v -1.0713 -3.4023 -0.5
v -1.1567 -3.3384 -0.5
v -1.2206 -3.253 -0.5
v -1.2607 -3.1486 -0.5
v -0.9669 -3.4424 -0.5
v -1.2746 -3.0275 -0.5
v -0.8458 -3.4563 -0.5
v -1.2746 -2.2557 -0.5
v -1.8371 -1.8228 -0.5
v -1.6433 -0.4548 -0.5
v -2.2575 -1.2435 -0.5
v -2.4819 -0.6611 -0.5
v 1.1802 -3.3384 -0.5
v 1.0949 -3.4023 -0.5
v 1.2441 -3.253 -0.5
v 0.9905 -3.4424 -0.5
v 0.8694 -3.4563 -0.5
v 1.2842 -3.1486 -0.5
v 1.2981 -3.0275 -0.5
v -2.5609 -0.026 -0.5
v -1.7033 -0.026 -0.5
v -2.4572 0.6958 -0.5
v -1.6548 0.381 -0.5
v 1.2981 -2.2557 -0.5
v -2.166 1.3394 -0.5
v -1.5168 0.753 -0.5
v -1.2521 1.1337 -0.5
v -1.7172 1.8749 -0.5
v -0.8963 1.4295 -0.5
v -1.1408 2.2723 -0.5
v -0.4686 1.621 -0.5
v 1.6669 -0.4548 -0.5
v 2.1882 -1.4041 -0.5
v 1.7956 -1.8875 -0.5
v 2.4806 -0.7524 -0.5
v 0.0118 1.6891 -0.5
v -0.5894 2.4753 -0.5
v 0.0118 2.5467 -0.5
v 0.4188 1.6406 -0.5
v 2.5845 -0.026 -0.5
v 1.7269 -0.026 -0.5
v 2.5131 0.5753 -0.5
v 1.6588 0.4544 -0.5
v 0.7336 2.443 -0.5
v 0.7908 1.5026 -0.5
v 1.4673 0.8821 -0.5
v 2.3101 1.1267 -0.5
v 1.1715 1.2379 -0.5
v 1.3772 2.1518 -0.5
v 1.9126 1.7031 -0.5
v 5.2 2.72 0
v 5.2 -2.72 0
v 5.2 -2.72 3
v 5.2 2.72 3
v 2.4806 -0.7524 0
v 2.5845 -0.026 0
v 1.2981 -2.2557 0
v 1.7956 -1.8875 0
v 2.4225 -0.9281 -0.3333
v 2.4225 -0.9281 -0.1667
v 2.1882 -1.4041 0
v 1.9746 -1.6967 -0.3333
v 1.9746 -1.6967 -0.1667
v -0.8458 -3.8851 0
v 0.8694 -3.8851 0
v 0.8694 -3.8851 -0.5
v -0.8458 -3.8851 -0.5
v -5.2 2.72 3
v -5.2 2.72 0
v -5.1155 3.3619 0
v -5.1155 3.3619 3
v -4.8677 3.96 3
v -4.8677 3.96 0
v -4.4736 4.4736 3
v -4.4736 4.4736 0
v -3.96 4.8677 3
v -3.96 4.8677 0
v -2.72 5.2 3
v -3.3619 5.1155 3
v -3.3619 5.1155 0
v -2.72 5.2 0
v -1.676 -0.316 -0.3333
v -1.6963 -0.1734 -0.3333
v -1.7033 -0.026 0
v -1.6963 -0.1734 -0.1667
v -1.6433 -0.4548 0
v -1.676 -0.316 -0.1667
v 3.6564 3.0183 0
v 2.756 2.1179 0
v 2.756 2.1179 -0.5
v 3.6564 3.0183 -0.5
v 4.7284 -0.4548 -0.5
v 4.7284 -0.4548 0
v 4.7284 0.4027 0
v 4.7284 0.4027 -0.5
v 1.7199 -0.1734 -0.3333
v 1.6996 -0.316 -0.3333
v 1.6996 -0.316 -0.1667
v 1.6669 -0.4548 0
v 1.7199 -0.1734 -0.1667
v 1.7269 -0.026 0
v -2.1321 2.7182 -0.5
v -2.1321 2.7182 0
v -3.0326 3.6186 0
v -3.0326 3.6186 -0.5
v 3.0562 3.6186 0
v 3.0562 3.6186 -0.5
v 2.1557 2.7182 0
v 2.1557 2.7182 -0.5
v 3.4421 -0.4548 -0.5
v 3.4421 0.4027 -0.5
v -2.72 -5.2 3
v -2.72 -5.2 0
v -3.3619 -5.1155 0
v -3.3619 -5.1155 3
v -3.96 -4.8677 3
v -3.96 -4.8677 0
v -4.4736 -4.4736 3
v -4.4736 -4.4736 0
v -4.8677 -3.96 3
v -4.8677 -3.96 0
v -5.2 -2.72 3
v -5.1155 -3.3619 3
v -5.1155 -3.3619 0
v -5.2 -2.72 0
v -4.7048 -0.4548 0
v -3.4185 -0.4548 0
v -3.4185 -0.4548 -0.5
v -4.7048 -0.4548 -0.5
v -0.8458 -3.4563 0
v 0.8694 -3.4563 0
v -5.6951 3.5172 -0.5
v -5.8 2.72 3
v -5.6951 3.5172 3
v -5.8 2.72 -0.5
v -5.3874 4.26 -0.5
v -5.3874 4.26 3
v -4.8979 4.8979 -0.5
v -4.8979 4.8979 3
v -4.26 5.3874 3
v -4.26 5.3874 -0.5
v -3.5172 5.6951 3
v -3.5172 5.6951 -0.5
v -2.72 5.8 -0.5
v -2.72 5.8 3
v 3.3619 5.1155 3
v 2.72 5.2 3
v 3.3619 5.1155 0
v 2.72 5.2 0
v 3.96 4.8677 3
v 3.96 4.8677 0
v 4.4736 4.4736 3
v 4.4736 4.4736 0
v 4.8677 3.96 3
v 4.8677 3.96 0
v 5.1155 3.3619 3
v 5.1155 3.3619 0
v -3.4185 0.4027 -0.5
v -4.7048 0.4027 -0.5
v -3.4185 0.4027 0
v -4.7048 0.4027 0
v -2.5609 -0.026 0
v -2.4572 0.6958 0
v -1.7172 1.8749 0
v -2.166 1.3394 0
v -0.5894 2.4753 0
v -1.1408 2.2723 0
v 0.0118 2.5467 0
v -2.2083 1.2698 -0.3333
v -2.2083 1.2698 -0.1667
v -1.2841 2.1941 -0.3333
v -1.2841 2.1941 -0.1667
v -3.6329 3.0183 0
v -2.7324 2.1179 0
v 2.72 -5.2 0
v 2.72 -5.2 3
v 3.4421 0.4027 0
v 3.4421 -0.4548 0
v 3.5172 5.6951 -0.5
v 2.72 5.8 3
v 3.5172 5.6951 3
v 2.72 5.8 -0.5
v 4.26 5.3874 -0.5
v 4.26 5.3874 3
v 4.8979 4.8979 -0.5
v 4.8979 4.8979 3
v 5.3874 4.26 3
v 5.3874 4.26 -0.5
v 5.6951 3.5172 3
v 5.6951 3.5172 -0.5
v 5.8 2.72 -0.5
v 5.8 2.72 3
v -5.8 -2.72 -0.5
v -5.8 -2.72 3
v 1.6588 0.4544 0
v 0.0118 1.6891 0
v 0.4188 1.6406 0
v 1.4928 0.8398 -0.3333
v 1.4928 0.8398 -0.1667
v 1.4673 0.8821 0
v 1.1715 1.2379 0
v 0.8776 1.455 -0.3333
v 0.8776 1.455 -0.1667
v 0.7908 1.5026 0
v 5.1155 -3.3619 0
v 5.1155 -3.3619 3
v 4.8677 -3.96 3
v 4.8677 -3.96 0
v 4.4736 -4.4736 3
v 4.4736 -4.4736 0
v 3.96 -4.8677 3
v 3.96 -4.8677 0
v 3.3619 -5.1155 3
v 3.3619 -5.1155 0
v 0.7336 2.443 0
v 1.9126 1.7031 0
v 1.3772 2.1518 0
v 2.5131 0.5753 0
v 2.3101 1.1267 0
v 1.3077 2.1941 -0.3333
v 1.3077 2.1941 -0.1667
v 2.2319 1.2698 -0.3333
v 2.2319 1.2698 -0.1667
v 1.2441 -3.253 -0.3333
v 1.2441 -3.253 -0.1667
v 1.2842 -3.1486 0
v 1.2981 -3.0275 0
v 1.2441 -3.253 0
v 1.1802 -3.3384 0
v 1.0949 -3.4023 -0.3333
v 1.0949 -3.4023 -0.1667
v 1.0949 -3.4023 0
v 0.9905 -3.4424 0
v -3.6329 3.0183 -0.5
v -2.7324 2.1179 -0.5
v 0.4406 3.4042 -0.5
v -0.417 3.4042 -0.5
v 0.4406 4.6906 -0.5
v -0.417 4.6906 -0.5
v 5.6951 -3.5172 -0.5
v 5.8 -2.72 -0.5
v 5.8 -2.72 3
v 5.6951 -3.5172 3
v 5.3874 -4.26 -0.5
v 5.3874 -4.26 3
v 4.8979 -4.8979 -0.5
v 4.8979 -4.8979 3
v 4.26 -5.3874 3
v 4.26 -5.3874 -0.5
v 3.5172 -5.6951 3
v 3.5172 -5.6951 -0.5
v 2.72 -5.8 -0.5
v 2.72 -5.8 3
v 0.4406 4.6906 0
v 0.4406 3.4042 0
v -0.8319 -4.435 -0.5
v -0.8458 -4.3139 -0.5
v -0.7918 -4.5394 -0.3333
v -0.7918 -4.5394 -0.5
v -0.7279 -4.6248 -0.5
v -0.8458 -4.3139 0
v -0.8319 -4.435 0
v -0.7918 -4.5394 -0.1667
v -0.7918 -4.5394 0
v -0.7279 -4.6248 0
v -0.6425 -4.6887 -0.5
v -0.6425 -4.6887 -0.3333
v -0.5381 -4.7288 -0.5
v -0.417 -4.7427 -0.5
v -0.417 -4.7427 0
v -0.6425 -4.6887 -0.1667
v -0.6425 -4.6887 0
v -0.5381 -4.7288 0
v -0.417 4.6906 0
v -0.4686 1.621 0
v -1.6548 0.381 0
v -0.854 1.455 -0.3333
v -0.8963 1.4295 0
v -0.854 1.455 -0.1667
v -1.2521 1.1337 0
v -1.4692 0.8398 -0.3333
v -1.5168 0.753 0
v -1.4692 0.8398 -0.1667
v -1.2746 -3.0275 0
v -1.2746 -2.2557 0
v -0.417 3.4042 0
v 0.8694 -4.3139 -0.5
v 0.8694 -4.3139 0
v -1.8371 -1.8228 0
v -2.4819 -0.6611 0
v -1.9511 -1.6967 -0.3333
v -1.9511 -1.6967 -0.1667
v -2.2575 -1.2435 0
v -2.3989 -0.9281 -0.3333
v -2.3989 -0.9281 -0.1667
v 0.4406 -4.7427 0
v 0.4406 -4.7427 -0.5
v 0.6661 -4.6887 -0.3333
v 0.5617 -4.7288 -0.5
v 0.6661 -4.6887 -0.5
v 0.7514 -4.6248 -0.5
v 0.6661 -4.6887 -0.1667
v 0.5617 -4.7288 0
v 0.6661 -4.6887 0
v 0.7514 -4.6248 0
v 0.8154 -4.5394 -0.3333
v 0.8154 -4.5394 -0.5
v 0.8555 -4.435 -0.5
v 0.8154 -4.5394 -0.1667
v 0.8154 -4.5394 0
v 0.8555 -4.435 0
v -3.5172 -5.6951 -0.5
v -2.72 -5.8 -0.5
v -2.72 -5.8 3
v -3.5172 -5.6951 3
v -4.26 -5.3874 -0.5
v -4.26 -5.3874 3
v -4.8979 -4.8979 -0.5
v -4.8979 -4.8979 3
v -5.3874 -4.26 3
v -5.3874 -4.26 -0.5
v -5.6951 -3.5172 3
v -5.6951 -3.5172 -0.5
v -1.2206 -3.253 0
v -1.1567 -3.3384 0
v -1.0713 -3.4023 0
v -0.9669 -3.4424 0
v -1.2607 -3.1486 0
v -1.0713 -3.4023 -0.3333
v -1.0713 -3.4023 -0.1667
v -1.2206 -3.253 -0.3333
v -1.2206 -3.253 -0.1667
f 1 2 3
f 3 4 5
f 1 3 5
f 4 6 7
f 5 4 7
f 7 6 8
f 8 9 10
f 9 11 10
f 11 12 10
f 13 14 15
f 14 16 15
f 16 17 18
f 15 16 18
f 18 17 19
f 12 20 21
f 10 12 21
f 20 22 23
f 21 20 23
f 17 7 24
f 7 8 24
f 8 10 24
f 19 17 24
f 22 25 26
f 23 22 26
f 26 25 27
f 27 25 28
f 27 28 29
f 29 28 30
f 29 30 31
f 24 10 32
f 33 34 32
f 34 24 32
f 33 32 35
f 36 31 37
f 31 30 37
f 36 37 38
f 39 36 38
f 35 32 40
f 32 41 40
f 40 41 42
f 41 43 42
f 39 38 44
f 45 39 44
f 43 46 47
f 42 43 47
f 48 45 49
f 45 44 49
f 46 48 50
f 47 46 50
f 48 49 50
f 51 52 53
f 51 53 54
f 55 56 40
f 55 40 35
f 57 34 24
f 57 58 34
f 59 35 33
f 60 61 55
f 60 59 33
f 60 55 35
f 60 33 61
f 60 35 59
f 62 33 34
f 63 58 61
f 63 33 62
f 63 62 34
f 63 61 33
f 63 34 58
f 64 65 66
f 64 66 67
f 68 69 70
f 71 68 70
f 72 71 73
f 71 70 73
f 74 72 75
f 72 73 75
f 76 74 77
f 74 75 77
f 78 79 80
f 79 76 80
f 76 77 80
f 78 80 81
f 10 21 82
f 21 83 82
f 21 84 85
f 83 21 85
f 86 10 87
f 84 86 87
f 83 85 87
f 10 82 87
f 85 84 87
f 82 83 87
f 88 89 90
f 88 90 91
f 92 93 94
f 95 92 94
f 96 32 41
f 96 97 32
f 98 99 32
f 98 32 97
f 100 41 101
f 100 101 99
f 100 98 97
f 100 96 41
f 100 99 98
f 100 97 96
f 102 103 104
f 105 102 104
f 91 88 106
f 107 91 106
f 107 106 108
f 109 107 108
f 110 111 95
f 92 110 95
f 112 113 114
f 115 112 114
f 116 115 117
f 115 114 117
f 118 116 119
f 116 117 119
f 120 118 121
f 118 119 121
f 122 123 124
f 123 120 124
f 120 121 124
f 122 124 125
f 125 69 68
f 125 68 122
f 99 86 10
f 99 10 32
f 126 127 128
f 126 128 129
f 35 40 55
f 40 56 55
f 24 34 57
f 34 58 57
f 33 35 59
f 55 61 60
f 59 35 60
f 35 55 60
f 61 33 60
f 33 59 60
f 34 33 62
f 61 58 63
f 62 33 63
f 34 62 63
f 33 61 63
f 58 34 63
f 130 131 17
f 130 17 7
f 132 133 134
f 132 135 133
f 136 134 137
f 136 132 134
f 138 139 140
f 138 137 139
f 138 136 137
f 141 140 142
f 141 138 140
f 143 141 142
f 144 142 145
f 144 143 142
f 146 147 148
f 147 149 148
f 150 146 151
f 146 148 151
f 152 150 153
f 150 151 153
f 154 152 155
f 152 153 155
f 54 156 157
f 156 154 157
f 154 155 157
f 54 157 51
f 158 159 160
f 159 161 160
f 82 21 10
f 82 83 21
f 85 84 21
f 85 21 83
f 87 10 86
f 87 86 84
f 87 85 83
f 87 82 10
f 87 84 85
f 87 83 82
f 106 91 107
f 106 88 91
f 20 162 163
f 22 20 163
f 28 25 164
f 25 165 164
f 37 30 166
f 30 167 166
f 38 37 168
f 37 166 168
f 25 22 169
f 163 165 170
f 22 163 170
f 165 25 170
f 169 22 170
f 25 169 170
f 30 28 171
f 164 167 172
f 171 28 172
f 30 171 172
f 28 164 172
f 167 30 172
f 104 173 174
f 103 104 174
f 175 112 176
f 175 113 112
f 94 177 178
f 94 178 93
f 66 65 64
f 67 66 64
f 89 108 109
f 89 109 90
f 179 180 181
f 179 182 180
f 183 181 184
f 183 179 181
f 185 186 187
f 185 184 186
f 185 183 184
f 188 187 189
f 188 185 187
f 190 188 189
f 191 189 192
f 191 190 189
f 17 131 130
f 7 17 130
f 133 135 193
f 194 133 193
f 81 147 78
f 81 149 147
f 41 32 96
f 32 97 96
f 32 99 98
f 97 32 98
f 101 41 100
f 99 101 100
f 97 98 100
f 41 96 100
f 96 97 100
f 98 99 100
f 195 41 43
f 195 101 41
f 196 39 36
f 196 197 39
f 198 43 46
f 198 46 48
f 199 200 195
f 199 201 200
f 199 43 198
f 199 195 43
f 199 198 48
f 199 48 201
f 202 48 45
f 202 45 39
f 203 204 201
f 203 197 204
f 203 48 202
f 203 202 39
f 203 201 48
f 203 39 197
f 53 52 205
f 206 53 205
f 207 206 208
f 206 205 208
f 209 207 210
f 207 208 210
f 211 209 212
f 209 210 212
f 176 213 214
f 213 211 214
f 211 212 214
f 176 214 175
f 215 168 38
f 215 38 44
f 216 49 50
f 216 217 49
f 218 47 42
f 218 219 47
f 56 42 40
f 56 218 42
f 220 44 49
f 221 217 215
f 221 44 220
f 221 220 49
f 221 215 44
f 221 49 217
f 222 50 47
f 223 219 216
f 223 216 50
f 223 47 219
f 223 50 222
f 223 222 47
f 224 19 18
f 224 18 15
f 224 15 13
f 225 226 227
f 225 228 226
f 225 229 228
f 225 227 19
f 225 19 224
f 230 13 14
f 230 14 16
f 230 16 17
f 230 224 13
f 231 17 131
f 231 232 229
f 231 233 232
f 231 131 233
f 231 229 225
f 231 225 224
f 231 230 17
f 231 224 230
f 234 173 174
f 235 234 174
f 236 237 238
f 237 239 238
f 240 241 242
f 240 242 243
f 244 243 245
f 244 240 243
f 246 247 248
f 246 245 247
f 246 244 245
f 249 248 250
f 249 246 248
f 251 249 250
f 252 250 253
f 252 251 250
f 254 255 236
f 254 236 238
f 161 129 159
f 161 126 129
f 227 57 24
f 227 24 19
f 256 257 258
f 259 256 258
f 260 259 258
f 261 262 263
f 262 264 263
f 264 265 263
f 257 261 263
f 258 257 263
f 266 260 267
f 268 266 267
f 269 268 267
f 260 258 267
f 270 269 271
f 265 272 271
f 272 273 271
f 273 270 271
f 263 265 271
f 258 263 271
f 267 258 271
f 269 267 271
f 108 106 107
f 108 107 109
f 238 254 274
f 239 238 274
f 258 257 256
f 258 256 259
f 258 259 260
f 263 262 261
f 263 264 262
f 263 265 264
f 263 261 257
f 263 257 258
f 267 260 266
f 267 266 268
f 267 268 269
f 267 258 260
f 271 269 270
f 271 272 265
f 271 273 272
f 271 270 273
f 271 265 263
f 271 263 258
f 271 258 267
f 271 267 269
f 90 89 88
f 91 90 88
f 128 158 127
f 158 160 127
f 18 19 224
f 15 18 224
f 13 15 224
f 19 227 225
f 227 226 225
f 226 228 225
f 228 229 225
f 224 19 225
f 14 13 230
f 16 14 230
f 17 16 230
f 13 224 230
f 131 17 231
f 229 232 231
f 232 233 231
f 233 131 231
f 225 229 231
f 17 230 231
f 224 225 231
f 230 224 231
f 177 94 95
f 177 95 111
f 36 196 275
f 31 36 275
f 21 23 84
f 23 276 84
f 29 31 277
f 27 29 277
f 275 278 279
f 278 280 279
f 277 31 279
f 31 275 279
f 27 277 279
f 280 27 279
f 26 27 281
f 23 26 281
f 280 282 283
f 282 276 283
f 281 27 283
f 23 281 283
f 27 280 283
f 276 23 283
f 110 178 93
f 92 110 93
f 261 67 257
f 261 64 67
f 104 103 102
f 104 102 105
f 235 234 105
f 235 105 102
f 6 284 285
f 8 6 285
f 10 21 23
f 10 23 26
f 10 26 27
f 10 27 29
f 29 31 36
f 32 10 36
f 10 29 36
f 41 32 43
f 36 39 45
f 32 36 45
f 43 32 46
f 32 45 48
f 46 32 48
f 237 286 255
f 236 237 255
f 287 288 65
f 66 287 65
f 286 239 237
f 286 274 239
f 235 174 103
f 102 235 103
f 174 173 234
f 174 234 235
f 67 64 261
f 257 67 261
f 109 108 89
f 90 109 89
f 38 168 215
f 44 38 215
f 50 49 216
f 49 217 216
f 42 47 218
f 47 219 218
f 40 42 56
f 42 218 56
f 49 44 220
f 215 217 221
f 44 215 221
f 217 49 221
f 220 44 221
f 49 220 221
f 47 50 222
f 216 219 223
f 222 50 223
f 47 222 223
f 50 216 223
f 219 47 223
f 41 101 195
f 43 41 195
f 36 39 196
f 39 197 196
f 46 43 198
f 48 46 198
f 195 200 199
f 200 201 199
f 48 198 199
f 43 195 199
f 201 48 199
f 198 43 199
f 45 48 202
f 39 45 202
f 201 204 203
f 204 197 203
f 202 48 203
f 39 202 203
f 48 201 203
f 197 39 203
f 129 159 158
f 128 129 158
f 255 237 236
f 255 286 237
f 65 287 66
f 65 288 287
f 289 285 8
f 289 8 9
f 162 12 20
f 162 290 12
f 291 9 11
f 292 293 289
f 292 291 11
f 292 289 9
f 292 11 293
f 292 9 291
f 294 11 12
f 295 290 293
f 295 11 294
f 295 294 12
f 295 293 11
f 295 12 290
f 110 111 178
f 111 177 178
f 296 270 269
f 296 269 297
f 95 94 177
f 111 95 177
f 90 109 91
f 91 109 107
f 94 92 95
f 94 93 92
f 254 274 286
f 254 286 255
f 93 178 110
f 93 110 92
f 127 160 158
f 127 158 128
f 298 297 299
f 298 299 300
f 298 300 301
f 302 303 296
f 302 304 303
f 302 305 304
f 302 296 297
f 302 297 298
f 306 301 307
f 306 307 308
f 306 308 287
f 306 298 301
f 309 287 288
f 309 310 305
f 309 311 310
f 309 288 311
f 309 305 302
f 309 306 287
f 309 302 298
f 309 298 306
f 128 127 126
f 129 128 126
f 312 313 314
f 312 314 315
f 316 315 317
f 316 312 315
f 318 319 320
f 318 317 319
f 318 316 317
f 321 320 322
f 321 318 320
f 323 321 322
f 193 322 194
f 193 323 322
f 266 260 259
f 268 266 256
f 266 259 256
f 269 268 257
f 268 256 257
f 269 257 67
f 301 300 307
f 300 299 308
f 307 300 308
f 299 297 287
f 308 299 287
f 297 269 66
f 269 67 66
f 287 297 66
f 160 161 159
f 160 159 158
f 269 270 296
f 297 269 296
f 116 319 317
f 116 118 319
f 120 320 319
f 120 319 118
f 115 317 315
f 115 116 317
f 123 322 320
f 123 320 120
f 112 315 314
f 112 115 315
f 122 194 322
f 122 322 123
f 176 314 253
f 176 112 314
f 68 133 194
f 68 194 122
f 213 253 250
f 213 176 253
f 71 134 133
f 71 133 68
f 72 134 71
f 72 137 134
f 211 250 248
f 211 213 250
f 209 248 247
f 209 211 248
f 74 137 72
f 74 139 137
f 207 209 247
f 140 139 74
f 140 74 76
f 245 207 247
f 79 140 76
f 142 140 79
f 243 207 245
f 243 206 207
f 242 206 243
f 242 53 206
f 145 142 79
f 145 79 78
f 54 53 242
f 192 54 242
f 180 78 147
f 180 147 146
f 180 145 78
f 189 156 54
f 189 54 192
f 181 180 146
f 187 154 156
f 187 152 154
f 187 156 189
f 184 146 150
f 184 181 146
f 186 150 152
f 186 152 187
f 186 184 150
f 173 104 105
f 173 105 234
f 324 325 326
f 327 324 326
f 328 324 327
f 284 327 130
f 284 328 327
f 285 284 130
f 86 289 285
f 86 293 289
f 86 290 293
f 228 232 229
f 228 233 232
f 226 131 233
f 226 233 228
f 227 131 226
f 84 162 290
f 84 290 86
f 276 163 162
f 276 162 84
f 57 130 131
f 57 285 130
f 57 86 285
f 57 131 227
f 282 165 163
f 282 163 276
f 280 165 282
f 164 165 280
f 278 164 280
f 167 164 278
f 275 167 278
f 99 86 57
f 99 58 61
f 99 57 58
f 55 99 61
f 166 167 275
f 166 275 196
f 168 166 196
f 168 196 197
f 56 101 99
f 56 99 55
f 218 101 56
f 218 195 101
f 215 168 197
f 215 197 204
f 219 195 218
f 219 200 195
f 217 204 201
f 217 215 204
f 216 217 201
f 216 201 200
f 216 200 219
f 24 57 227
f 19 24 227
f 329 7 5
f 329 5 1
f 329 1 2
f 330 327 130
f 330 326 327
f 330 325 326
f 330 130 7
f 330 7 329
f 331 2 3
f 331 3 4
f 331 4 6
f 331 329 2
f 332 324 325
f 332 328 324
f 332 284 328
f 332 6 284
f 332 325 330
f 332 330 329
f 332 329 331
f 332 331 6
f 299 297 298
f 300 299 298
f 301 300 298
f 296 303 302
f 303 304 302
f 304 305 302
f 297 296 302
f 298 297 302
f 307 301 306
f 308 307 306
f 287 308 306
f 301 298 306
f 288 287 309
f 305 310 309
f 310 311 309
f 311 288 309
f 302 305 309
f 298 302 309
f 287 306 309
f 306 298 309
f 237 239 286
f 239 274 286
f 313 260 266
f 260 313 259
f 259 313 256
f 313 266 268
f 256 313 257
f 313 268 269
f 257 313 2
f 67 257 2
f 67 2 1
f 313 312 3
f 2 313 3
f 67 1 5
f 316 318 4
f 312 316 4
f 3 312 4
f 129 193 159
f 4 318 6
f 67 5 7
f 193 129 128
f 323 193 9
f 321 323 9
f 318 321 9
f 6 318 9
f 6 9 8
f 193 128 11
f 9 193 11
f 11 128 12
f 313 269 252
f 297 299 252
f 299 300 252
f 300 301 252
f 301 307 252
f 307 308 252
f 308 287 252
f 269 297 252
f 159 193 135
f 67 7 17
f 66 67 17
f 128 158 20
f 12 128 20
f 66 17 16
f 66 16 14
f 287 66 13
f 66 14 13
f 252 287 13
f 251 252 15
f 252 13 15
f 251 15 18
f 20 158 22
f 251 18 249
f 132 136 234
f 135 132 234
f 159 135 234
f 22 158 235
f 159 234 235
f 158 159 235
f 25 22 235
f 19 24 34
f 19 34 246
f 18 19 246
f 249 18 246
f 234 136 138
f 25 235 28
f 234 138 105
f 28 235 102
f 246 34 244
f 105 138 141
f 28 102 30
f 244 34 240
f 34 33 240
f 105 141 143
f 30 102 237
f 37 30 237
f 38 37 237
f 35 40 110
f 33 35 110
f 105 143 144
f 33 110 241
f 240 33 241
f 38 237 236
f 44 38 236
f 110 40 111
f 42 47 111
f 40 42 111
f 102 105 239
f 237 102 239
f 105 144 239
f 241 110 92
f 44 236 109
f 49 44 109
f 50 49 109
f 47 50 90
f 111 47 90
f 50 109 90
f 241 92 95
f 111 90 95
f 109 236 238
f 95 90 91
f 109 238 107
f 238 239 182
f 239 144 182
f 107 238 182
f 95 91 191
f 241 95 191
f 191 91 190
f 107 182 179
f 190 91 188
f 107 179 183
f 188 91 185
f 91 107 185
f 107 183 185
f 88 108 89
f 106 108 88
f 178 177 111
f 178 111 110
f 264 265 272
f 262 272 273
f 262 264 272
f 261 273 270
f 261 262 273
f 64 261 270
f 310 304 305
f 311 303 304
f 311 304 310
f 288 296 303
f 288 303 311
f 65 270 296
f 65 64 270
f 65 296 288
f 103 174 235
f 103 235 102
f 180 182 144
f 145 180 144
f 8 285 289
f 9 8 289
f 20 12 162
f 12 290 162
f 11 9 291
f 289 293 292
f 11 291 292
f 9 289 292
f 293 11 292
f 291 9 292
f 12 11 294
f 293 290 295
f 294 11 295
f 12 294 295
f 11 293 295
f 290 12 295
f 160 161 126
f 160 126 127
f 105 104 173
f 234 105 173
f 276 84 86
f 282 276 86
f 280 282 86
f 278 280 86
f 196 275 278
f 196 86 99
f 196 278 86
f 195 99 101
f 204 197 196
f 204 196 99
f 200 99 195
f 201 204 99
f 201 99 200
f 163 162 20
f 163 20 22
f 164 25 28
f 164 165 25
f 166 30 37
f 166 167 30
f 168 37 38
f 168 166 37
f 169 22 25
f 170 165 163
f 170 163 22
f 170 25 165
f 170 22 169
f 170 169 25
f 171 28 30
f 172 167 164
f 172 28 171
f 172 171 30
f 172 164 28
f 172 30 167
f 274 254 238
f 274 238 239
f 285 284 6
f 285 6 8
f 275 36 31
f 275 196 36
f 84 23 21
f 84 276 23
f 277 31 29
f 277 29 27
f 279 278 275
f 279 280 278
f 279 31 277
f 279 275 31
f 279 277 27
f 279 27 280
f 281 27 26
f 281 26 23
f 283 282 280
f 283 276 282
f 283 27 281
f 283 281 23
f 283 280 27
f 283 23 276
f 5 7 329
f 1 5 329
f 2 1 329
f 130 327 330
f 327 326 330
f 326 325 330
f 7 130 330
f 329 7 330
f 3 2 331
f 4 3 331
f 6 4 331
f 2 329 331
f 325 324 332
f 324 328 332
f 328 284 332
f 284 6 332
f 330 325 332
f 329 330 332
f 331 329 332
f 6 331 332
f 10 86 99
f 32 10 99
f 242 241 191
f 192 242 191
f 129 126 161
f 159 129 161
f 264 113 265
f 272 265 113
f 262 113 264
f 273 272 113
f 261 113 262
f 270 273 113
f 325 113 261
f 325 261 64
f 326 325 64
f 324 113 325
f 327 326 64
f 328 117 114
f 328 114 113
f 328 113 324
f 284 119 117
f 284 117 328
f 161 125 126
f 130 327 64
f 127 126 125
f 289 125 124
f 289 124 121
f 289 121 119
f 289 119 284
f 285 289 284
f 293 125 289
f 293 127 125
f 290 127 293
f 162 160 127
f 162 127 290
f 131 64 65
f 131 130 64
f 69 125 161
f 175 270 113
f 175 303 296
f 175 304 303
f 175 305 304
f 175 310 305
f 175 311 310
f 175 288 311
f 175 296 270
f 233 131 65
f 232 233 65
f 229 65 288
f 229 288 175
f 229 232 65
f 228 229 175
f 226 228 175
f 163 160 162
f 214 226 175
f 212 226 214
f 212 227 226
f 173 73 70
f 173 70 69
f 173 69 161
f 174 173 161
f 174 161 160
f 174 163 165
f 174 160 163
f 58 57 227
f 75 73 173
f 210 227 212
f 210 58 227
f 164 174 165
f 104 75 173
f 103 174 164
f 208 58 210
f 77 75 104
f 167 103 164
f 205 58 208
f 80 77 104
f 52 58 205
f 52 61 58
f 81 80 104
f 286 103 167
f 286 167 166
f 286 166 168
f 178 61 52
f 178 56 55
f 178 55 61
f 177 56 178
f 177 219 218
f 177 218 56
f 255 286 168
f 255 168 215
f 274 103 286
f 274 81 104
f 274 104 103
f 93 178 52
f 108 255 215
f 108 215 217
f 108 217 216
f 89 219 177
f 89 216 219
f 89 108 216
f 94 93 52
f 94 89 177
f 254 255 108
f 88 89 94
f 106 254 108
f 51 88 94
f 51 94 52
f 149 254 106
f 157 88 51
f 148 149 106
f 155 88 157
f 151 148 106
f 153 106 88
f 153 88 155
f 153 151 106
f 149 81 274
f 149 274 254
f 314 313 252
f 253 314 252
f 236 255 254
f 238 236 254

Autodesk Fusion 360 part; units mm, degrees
sketch "Sketch1" plane through (0, 0, 0) normal (0, 0, 1) x (1, 0, 0)
  line L0 (2.72, 5) -> (-2.72, 5)
  line L1 (-5, 2.72) -> (-5, -2.72)
  line L2 (-2.72, -5) -> (2.72, -5)
  line L3 (5, -2.72) -> (5, 2.72)
  line L4 (5, 5) -> (-5, -5) construction
  line L5 (-5, 5) -> (5, -5) construction
  arc A0 (5, 2.72) -> (2.72, 5) centre (2.72, 2.72) ccw
  arc A1 (2.72, -5) -> (5, -2.72) centre (2.72, -2.72) ccw
  arc A2 (-5, -2.72) -> (-2.72, -5) centre (-2.72, -2.72) ccw
  arc A3 (-2.72, 5) -> (-5, 2.72) centre (-2.72, 2.72) ccw
  line L6 (-2.72, -5.2) -> (2.72, -5.2)
  arc A4 (2.72, -5.2) -> (5.2, -2.72) centre (2.72, -2.72) ccw
  line L7 (5.2, -2.72) -> (5.2, 2.72)
  arc A5 (5.2, 2.72) -> (2.72, 5.2) centre (2.72, 2.72) ccw
  line L8 (2.72, 5.2) -> (-2.72, 5.2)
  arc A6 (-2.72, 5.2) -> (-5.2, 2.72) centre (-2.72, 2.72) ccw
  line L9 (-5.2, 2.72) -> (-5.2, -2.72)
  arc A7 (-5.2, -2.72) -> (-2.72, -5.2) centre (-2.72, -2.72) ccw
  line L10 (-2.72, -5.8) -> (2.72, -5.8)
  arc A8 (2.72, -5.8) -> (5.8, -2.72) centre (2.72, -2.72) ccw
  line L11 (5.8, -2.72) -> (5.8, 2.72)
  arc A9 (5.8, 2.72) -> (2.72, 5.8) centre (2.72, 2.72) ccw
  line L12 (2.72, 5.8) -> (-2.72, 5.8)
  arc A10 (-2.72, 5.8) -> (-5.8, 2.72) centre (-2.72, 2.72) ccw
  line L13 (-5.8, 2.72) -> (-5.8, -2.72)
  arc A11 (-5.8, -2.72) -> (-2.72, -5.8) centre (-2.72, -2.72) ccw
  dimension "d1" = 10
  dimension "d2" = 10
  dimension "d3" = 2.28
  dimension "d4" = 0.2
  dimension "d5" = 0.8
extrude "Extrude1" add sketch "Sketch1" along normal blind 3 contours L10 A8 L11 A9 L12 A10 L13 A11 makes body 1
extrude "Extrude2" add sketch "Sketch1" against normal blind 0.5 contours L0 L1 L2 L3 A0 A1 A2 A3 | L6 A4 L7 A5 L8 A6 L9 A7 | L10 A8 L11 A9 L12 A10 L13 A11 bodies 1
sketch "Sketch2" plane through (0, 0, 0) normal (0, 0, 1) x (1, 0, 0)
  line L0 (-2.72, -5.2) -> (2.72, -5.2)
  arc A0 (2.72, -5.2) -> (5.2, -2.72) centre (2.72, -2.72) ccw
  line L1 (5.2, -2.72) -> (5.2, 2.72)
  arc A1 (5.2, 2.72) -> (2.72, 5.2) centre (2.72, 2.72) ccw
  line L2 (2.72, 5.2) -> (-2.72, 5.2)
  arc A2 (-2.72, 5.2) -> (-5.2, 2.72) centre (-2.72, 2.72) ccw
  line L3 (-5.2, 2.72) -> (-5.2, -2.72)
  arc A3 (-5.2, -2.72) -> (-2.72, -5.2) centre (-2.72, -2.72) ccw
  line L4 (-4.7048, 0.4027) -> (-3.4185, 0.4027)
  line L5 (-3.4185, 0.4027) -> (-3.4185, -0.4548)
  line L6 (-3.4185, -0.4548) -> (-4.7048, -0.4548)
  line L7 (-4.7048, -0.4548) -> (-4.7048, 0.4027)
  spline S0 degree 3 poles (-0.8458, -4.3139) (-0.8458, -4.5712) (-0.6743, -4.7427) (-0.417, -4.7427) knots 0 0 0 0 1 1 1 1
  line L8 (-0.417, -4.7427) -> (0.4406, -4.7427)
  spline S1 degree 3 poles (0.4406, -4.7427) (0.6978, -4.7427) (0.8694, -4.5712) (0.8694, -4.3139) knots 0 0 0 0 1 1 1 1
  line L9 (0.8694, -4.3139) -> (0.8694, -3.8851)
  line L10 (0.8694, -3.8851) -> (-0.8458, -3.8851)
  line L11 (-0.8458, -3.8851) -> (-0.8458, -4.3139)
  line L12 (0.4406, 4.6906) -> (-0.417, 4.6906)
  line L13 (-0.417, 4.6906) -> (-0.417, 3.4042)
  line L14 (-0.417, 3.4042) -> (0.4406, 3.4042)
  line L15 (0.4406, 3.4042) -> (0.4406, 4.6906)
  line L16 (-3.0326, 3.6186) -> (-3.6329, 3.0183)
  line L17 (-3.6329, 3.0183) -> (-2.7324, 2.1179)
  line L18 (-2.7324, 2.1179) -> (-2.1321, 2.7182)
  line L19 (-2.1321, 2.7182) -> (-3.0326, 3.6186)
  line L20 (3.4421, 0.4027) -> (3.4421, -0.4548)
  line L21 (3.4421, -0.4548) -> (4.7284, -0.4548)
  line L22 (4.7284, -0.4548) -> (4.7284, 0.4027)
  line L23 (4.7284, 0.4027) -> (3.4421, 0.4027)
  line L24 (3.0562, 3.6186) -> (2.1557, 2.7182)
  line L25 (2.1557, 2.7182) -> (2.756, 2.1179)
  line L26 (2.756, 2.1179) -> (3.6564, 3.0183)
  line L27 (3.6564, 3.0183) -> (3.0562, 3.6186)
  spline S2 degree 3 poles (2.5845, -0.026) (2.5845, -0.9694) (2.0699, -1.8269) (1.2981, -2.2557) knots 0 0 0 0 1 1 1 1
  line L28 (1.2981, -2.2557) -> (1.2981, -3.0275)
  spline S3 degree 3 poles (1.2981, -3.0275) (1.2981, -3.2848) (1.1266, -3.4563) (0.8694, -3.4563) knots 0 0 0 0 1 1 1 1
  line L29 (0.8694, -3.4563) -> (-0.8458, -3.4563)
  spline S4 degree 3 poles (-0.8458, -3.4563) (-1.1031, -3.4563) (-1.2746, -3.2848) (-1.2746, -3.0275) knots 0 0 0 0 1 1 1 1
  line L30 (-1.2746, -3.0275) -> (-1.2746, -2.2557)
  spline S5 degree 3 poles (-1.2746, -2.2557) (-2.0464, -1.8269) (-2.5609, -0.9694) (-2.5609, -0.026) knots 0 0 0 0 1 1 1 1
  spline S6 degree 3 poles (-2.5609, -0.026) (-2.5609, 1.3889) (-1.4032, 2.5467) (0.0118, 2.5467) knots 0 0 0 0 1 1 1 1
  spline S7 degree 3 poles (0.0118, 2.5467) (1.4268, 2.5467) (2.5845, 1.3889) (2.5845, -0.026) knots 0 0 0 0 1 1 1 1
  spline S8 degree 3 poles (-1.7033, -0.026) (-1.7033, -0.1761) (-1.6819, -0.3176) (-1.6433, -0.4548) knots 0 0 0 0 1 1 1 1
  line L31 (-1.6433, -0.4548) -> (1.6669, -0.4548)
  spline S9 degree 3 poles (1.6669, -0.4548) (1.7055, -0.3176) (1.7269, -0.1761) (1.7269, -0.026) knots 0 0 0 0 1 1 1 1
  spline S10 degree 3 poles (1.7269, -0.026) (1.7269, 0.9216) (0.9594, 1.6891) (0.0118, 1.6891) knots 0 0 0 0 1 1 1 1
  spline S11 degree 3 poles (0.0118, 1.6891) (-0.9358, 1.6891) (-1.7033, 0.9216) (-1.7033, -0.026) knots 0 0 0 0 1 1 1 1
extrude "Extrude3" cut sketch "Sketch2" against normal blind 0.5 contours L4 L5 L6 L7 | S0 L8 S1 L9 L10 L11 | L12 L13 L14 L15 | L16 L17 L18 L19 | L20 L21 L22 L23 | L24 L25 L26 L27 | S2 L28 S3 L29 S4 L30 S5 S6 S7 bodies 1 makes body 2 at (0.0118, 0.2598, -0.5)
extrude "Extrude4" add sketch "Sketch2" against normal blind 0.5 separate body contours L4 L5 L6 L7 | S0 L8 S1 L9 L10 L11 | L12 L13 L14 L15 | L16 L17 L18 L19 | L20 L21 L22 L23 | L24 L25 L26 L27 | S2 L28 S3 L29 S4 L30 S5 S6 S7 makes body 3 at (3.8708, 0.1169, 0) makes body 4 at (-4.2761, 0.1169, 0) makes body 5 at (2.8561, 2.6181, 0) makes body 6 at (-0.417, -1.0551, 0) makes body 7 at (-2.6324, 2.8182, 0) makes body 8 at (-0.1311, 3.833, 0) makes body 9 at (-0.1311, -4.171, 0)
